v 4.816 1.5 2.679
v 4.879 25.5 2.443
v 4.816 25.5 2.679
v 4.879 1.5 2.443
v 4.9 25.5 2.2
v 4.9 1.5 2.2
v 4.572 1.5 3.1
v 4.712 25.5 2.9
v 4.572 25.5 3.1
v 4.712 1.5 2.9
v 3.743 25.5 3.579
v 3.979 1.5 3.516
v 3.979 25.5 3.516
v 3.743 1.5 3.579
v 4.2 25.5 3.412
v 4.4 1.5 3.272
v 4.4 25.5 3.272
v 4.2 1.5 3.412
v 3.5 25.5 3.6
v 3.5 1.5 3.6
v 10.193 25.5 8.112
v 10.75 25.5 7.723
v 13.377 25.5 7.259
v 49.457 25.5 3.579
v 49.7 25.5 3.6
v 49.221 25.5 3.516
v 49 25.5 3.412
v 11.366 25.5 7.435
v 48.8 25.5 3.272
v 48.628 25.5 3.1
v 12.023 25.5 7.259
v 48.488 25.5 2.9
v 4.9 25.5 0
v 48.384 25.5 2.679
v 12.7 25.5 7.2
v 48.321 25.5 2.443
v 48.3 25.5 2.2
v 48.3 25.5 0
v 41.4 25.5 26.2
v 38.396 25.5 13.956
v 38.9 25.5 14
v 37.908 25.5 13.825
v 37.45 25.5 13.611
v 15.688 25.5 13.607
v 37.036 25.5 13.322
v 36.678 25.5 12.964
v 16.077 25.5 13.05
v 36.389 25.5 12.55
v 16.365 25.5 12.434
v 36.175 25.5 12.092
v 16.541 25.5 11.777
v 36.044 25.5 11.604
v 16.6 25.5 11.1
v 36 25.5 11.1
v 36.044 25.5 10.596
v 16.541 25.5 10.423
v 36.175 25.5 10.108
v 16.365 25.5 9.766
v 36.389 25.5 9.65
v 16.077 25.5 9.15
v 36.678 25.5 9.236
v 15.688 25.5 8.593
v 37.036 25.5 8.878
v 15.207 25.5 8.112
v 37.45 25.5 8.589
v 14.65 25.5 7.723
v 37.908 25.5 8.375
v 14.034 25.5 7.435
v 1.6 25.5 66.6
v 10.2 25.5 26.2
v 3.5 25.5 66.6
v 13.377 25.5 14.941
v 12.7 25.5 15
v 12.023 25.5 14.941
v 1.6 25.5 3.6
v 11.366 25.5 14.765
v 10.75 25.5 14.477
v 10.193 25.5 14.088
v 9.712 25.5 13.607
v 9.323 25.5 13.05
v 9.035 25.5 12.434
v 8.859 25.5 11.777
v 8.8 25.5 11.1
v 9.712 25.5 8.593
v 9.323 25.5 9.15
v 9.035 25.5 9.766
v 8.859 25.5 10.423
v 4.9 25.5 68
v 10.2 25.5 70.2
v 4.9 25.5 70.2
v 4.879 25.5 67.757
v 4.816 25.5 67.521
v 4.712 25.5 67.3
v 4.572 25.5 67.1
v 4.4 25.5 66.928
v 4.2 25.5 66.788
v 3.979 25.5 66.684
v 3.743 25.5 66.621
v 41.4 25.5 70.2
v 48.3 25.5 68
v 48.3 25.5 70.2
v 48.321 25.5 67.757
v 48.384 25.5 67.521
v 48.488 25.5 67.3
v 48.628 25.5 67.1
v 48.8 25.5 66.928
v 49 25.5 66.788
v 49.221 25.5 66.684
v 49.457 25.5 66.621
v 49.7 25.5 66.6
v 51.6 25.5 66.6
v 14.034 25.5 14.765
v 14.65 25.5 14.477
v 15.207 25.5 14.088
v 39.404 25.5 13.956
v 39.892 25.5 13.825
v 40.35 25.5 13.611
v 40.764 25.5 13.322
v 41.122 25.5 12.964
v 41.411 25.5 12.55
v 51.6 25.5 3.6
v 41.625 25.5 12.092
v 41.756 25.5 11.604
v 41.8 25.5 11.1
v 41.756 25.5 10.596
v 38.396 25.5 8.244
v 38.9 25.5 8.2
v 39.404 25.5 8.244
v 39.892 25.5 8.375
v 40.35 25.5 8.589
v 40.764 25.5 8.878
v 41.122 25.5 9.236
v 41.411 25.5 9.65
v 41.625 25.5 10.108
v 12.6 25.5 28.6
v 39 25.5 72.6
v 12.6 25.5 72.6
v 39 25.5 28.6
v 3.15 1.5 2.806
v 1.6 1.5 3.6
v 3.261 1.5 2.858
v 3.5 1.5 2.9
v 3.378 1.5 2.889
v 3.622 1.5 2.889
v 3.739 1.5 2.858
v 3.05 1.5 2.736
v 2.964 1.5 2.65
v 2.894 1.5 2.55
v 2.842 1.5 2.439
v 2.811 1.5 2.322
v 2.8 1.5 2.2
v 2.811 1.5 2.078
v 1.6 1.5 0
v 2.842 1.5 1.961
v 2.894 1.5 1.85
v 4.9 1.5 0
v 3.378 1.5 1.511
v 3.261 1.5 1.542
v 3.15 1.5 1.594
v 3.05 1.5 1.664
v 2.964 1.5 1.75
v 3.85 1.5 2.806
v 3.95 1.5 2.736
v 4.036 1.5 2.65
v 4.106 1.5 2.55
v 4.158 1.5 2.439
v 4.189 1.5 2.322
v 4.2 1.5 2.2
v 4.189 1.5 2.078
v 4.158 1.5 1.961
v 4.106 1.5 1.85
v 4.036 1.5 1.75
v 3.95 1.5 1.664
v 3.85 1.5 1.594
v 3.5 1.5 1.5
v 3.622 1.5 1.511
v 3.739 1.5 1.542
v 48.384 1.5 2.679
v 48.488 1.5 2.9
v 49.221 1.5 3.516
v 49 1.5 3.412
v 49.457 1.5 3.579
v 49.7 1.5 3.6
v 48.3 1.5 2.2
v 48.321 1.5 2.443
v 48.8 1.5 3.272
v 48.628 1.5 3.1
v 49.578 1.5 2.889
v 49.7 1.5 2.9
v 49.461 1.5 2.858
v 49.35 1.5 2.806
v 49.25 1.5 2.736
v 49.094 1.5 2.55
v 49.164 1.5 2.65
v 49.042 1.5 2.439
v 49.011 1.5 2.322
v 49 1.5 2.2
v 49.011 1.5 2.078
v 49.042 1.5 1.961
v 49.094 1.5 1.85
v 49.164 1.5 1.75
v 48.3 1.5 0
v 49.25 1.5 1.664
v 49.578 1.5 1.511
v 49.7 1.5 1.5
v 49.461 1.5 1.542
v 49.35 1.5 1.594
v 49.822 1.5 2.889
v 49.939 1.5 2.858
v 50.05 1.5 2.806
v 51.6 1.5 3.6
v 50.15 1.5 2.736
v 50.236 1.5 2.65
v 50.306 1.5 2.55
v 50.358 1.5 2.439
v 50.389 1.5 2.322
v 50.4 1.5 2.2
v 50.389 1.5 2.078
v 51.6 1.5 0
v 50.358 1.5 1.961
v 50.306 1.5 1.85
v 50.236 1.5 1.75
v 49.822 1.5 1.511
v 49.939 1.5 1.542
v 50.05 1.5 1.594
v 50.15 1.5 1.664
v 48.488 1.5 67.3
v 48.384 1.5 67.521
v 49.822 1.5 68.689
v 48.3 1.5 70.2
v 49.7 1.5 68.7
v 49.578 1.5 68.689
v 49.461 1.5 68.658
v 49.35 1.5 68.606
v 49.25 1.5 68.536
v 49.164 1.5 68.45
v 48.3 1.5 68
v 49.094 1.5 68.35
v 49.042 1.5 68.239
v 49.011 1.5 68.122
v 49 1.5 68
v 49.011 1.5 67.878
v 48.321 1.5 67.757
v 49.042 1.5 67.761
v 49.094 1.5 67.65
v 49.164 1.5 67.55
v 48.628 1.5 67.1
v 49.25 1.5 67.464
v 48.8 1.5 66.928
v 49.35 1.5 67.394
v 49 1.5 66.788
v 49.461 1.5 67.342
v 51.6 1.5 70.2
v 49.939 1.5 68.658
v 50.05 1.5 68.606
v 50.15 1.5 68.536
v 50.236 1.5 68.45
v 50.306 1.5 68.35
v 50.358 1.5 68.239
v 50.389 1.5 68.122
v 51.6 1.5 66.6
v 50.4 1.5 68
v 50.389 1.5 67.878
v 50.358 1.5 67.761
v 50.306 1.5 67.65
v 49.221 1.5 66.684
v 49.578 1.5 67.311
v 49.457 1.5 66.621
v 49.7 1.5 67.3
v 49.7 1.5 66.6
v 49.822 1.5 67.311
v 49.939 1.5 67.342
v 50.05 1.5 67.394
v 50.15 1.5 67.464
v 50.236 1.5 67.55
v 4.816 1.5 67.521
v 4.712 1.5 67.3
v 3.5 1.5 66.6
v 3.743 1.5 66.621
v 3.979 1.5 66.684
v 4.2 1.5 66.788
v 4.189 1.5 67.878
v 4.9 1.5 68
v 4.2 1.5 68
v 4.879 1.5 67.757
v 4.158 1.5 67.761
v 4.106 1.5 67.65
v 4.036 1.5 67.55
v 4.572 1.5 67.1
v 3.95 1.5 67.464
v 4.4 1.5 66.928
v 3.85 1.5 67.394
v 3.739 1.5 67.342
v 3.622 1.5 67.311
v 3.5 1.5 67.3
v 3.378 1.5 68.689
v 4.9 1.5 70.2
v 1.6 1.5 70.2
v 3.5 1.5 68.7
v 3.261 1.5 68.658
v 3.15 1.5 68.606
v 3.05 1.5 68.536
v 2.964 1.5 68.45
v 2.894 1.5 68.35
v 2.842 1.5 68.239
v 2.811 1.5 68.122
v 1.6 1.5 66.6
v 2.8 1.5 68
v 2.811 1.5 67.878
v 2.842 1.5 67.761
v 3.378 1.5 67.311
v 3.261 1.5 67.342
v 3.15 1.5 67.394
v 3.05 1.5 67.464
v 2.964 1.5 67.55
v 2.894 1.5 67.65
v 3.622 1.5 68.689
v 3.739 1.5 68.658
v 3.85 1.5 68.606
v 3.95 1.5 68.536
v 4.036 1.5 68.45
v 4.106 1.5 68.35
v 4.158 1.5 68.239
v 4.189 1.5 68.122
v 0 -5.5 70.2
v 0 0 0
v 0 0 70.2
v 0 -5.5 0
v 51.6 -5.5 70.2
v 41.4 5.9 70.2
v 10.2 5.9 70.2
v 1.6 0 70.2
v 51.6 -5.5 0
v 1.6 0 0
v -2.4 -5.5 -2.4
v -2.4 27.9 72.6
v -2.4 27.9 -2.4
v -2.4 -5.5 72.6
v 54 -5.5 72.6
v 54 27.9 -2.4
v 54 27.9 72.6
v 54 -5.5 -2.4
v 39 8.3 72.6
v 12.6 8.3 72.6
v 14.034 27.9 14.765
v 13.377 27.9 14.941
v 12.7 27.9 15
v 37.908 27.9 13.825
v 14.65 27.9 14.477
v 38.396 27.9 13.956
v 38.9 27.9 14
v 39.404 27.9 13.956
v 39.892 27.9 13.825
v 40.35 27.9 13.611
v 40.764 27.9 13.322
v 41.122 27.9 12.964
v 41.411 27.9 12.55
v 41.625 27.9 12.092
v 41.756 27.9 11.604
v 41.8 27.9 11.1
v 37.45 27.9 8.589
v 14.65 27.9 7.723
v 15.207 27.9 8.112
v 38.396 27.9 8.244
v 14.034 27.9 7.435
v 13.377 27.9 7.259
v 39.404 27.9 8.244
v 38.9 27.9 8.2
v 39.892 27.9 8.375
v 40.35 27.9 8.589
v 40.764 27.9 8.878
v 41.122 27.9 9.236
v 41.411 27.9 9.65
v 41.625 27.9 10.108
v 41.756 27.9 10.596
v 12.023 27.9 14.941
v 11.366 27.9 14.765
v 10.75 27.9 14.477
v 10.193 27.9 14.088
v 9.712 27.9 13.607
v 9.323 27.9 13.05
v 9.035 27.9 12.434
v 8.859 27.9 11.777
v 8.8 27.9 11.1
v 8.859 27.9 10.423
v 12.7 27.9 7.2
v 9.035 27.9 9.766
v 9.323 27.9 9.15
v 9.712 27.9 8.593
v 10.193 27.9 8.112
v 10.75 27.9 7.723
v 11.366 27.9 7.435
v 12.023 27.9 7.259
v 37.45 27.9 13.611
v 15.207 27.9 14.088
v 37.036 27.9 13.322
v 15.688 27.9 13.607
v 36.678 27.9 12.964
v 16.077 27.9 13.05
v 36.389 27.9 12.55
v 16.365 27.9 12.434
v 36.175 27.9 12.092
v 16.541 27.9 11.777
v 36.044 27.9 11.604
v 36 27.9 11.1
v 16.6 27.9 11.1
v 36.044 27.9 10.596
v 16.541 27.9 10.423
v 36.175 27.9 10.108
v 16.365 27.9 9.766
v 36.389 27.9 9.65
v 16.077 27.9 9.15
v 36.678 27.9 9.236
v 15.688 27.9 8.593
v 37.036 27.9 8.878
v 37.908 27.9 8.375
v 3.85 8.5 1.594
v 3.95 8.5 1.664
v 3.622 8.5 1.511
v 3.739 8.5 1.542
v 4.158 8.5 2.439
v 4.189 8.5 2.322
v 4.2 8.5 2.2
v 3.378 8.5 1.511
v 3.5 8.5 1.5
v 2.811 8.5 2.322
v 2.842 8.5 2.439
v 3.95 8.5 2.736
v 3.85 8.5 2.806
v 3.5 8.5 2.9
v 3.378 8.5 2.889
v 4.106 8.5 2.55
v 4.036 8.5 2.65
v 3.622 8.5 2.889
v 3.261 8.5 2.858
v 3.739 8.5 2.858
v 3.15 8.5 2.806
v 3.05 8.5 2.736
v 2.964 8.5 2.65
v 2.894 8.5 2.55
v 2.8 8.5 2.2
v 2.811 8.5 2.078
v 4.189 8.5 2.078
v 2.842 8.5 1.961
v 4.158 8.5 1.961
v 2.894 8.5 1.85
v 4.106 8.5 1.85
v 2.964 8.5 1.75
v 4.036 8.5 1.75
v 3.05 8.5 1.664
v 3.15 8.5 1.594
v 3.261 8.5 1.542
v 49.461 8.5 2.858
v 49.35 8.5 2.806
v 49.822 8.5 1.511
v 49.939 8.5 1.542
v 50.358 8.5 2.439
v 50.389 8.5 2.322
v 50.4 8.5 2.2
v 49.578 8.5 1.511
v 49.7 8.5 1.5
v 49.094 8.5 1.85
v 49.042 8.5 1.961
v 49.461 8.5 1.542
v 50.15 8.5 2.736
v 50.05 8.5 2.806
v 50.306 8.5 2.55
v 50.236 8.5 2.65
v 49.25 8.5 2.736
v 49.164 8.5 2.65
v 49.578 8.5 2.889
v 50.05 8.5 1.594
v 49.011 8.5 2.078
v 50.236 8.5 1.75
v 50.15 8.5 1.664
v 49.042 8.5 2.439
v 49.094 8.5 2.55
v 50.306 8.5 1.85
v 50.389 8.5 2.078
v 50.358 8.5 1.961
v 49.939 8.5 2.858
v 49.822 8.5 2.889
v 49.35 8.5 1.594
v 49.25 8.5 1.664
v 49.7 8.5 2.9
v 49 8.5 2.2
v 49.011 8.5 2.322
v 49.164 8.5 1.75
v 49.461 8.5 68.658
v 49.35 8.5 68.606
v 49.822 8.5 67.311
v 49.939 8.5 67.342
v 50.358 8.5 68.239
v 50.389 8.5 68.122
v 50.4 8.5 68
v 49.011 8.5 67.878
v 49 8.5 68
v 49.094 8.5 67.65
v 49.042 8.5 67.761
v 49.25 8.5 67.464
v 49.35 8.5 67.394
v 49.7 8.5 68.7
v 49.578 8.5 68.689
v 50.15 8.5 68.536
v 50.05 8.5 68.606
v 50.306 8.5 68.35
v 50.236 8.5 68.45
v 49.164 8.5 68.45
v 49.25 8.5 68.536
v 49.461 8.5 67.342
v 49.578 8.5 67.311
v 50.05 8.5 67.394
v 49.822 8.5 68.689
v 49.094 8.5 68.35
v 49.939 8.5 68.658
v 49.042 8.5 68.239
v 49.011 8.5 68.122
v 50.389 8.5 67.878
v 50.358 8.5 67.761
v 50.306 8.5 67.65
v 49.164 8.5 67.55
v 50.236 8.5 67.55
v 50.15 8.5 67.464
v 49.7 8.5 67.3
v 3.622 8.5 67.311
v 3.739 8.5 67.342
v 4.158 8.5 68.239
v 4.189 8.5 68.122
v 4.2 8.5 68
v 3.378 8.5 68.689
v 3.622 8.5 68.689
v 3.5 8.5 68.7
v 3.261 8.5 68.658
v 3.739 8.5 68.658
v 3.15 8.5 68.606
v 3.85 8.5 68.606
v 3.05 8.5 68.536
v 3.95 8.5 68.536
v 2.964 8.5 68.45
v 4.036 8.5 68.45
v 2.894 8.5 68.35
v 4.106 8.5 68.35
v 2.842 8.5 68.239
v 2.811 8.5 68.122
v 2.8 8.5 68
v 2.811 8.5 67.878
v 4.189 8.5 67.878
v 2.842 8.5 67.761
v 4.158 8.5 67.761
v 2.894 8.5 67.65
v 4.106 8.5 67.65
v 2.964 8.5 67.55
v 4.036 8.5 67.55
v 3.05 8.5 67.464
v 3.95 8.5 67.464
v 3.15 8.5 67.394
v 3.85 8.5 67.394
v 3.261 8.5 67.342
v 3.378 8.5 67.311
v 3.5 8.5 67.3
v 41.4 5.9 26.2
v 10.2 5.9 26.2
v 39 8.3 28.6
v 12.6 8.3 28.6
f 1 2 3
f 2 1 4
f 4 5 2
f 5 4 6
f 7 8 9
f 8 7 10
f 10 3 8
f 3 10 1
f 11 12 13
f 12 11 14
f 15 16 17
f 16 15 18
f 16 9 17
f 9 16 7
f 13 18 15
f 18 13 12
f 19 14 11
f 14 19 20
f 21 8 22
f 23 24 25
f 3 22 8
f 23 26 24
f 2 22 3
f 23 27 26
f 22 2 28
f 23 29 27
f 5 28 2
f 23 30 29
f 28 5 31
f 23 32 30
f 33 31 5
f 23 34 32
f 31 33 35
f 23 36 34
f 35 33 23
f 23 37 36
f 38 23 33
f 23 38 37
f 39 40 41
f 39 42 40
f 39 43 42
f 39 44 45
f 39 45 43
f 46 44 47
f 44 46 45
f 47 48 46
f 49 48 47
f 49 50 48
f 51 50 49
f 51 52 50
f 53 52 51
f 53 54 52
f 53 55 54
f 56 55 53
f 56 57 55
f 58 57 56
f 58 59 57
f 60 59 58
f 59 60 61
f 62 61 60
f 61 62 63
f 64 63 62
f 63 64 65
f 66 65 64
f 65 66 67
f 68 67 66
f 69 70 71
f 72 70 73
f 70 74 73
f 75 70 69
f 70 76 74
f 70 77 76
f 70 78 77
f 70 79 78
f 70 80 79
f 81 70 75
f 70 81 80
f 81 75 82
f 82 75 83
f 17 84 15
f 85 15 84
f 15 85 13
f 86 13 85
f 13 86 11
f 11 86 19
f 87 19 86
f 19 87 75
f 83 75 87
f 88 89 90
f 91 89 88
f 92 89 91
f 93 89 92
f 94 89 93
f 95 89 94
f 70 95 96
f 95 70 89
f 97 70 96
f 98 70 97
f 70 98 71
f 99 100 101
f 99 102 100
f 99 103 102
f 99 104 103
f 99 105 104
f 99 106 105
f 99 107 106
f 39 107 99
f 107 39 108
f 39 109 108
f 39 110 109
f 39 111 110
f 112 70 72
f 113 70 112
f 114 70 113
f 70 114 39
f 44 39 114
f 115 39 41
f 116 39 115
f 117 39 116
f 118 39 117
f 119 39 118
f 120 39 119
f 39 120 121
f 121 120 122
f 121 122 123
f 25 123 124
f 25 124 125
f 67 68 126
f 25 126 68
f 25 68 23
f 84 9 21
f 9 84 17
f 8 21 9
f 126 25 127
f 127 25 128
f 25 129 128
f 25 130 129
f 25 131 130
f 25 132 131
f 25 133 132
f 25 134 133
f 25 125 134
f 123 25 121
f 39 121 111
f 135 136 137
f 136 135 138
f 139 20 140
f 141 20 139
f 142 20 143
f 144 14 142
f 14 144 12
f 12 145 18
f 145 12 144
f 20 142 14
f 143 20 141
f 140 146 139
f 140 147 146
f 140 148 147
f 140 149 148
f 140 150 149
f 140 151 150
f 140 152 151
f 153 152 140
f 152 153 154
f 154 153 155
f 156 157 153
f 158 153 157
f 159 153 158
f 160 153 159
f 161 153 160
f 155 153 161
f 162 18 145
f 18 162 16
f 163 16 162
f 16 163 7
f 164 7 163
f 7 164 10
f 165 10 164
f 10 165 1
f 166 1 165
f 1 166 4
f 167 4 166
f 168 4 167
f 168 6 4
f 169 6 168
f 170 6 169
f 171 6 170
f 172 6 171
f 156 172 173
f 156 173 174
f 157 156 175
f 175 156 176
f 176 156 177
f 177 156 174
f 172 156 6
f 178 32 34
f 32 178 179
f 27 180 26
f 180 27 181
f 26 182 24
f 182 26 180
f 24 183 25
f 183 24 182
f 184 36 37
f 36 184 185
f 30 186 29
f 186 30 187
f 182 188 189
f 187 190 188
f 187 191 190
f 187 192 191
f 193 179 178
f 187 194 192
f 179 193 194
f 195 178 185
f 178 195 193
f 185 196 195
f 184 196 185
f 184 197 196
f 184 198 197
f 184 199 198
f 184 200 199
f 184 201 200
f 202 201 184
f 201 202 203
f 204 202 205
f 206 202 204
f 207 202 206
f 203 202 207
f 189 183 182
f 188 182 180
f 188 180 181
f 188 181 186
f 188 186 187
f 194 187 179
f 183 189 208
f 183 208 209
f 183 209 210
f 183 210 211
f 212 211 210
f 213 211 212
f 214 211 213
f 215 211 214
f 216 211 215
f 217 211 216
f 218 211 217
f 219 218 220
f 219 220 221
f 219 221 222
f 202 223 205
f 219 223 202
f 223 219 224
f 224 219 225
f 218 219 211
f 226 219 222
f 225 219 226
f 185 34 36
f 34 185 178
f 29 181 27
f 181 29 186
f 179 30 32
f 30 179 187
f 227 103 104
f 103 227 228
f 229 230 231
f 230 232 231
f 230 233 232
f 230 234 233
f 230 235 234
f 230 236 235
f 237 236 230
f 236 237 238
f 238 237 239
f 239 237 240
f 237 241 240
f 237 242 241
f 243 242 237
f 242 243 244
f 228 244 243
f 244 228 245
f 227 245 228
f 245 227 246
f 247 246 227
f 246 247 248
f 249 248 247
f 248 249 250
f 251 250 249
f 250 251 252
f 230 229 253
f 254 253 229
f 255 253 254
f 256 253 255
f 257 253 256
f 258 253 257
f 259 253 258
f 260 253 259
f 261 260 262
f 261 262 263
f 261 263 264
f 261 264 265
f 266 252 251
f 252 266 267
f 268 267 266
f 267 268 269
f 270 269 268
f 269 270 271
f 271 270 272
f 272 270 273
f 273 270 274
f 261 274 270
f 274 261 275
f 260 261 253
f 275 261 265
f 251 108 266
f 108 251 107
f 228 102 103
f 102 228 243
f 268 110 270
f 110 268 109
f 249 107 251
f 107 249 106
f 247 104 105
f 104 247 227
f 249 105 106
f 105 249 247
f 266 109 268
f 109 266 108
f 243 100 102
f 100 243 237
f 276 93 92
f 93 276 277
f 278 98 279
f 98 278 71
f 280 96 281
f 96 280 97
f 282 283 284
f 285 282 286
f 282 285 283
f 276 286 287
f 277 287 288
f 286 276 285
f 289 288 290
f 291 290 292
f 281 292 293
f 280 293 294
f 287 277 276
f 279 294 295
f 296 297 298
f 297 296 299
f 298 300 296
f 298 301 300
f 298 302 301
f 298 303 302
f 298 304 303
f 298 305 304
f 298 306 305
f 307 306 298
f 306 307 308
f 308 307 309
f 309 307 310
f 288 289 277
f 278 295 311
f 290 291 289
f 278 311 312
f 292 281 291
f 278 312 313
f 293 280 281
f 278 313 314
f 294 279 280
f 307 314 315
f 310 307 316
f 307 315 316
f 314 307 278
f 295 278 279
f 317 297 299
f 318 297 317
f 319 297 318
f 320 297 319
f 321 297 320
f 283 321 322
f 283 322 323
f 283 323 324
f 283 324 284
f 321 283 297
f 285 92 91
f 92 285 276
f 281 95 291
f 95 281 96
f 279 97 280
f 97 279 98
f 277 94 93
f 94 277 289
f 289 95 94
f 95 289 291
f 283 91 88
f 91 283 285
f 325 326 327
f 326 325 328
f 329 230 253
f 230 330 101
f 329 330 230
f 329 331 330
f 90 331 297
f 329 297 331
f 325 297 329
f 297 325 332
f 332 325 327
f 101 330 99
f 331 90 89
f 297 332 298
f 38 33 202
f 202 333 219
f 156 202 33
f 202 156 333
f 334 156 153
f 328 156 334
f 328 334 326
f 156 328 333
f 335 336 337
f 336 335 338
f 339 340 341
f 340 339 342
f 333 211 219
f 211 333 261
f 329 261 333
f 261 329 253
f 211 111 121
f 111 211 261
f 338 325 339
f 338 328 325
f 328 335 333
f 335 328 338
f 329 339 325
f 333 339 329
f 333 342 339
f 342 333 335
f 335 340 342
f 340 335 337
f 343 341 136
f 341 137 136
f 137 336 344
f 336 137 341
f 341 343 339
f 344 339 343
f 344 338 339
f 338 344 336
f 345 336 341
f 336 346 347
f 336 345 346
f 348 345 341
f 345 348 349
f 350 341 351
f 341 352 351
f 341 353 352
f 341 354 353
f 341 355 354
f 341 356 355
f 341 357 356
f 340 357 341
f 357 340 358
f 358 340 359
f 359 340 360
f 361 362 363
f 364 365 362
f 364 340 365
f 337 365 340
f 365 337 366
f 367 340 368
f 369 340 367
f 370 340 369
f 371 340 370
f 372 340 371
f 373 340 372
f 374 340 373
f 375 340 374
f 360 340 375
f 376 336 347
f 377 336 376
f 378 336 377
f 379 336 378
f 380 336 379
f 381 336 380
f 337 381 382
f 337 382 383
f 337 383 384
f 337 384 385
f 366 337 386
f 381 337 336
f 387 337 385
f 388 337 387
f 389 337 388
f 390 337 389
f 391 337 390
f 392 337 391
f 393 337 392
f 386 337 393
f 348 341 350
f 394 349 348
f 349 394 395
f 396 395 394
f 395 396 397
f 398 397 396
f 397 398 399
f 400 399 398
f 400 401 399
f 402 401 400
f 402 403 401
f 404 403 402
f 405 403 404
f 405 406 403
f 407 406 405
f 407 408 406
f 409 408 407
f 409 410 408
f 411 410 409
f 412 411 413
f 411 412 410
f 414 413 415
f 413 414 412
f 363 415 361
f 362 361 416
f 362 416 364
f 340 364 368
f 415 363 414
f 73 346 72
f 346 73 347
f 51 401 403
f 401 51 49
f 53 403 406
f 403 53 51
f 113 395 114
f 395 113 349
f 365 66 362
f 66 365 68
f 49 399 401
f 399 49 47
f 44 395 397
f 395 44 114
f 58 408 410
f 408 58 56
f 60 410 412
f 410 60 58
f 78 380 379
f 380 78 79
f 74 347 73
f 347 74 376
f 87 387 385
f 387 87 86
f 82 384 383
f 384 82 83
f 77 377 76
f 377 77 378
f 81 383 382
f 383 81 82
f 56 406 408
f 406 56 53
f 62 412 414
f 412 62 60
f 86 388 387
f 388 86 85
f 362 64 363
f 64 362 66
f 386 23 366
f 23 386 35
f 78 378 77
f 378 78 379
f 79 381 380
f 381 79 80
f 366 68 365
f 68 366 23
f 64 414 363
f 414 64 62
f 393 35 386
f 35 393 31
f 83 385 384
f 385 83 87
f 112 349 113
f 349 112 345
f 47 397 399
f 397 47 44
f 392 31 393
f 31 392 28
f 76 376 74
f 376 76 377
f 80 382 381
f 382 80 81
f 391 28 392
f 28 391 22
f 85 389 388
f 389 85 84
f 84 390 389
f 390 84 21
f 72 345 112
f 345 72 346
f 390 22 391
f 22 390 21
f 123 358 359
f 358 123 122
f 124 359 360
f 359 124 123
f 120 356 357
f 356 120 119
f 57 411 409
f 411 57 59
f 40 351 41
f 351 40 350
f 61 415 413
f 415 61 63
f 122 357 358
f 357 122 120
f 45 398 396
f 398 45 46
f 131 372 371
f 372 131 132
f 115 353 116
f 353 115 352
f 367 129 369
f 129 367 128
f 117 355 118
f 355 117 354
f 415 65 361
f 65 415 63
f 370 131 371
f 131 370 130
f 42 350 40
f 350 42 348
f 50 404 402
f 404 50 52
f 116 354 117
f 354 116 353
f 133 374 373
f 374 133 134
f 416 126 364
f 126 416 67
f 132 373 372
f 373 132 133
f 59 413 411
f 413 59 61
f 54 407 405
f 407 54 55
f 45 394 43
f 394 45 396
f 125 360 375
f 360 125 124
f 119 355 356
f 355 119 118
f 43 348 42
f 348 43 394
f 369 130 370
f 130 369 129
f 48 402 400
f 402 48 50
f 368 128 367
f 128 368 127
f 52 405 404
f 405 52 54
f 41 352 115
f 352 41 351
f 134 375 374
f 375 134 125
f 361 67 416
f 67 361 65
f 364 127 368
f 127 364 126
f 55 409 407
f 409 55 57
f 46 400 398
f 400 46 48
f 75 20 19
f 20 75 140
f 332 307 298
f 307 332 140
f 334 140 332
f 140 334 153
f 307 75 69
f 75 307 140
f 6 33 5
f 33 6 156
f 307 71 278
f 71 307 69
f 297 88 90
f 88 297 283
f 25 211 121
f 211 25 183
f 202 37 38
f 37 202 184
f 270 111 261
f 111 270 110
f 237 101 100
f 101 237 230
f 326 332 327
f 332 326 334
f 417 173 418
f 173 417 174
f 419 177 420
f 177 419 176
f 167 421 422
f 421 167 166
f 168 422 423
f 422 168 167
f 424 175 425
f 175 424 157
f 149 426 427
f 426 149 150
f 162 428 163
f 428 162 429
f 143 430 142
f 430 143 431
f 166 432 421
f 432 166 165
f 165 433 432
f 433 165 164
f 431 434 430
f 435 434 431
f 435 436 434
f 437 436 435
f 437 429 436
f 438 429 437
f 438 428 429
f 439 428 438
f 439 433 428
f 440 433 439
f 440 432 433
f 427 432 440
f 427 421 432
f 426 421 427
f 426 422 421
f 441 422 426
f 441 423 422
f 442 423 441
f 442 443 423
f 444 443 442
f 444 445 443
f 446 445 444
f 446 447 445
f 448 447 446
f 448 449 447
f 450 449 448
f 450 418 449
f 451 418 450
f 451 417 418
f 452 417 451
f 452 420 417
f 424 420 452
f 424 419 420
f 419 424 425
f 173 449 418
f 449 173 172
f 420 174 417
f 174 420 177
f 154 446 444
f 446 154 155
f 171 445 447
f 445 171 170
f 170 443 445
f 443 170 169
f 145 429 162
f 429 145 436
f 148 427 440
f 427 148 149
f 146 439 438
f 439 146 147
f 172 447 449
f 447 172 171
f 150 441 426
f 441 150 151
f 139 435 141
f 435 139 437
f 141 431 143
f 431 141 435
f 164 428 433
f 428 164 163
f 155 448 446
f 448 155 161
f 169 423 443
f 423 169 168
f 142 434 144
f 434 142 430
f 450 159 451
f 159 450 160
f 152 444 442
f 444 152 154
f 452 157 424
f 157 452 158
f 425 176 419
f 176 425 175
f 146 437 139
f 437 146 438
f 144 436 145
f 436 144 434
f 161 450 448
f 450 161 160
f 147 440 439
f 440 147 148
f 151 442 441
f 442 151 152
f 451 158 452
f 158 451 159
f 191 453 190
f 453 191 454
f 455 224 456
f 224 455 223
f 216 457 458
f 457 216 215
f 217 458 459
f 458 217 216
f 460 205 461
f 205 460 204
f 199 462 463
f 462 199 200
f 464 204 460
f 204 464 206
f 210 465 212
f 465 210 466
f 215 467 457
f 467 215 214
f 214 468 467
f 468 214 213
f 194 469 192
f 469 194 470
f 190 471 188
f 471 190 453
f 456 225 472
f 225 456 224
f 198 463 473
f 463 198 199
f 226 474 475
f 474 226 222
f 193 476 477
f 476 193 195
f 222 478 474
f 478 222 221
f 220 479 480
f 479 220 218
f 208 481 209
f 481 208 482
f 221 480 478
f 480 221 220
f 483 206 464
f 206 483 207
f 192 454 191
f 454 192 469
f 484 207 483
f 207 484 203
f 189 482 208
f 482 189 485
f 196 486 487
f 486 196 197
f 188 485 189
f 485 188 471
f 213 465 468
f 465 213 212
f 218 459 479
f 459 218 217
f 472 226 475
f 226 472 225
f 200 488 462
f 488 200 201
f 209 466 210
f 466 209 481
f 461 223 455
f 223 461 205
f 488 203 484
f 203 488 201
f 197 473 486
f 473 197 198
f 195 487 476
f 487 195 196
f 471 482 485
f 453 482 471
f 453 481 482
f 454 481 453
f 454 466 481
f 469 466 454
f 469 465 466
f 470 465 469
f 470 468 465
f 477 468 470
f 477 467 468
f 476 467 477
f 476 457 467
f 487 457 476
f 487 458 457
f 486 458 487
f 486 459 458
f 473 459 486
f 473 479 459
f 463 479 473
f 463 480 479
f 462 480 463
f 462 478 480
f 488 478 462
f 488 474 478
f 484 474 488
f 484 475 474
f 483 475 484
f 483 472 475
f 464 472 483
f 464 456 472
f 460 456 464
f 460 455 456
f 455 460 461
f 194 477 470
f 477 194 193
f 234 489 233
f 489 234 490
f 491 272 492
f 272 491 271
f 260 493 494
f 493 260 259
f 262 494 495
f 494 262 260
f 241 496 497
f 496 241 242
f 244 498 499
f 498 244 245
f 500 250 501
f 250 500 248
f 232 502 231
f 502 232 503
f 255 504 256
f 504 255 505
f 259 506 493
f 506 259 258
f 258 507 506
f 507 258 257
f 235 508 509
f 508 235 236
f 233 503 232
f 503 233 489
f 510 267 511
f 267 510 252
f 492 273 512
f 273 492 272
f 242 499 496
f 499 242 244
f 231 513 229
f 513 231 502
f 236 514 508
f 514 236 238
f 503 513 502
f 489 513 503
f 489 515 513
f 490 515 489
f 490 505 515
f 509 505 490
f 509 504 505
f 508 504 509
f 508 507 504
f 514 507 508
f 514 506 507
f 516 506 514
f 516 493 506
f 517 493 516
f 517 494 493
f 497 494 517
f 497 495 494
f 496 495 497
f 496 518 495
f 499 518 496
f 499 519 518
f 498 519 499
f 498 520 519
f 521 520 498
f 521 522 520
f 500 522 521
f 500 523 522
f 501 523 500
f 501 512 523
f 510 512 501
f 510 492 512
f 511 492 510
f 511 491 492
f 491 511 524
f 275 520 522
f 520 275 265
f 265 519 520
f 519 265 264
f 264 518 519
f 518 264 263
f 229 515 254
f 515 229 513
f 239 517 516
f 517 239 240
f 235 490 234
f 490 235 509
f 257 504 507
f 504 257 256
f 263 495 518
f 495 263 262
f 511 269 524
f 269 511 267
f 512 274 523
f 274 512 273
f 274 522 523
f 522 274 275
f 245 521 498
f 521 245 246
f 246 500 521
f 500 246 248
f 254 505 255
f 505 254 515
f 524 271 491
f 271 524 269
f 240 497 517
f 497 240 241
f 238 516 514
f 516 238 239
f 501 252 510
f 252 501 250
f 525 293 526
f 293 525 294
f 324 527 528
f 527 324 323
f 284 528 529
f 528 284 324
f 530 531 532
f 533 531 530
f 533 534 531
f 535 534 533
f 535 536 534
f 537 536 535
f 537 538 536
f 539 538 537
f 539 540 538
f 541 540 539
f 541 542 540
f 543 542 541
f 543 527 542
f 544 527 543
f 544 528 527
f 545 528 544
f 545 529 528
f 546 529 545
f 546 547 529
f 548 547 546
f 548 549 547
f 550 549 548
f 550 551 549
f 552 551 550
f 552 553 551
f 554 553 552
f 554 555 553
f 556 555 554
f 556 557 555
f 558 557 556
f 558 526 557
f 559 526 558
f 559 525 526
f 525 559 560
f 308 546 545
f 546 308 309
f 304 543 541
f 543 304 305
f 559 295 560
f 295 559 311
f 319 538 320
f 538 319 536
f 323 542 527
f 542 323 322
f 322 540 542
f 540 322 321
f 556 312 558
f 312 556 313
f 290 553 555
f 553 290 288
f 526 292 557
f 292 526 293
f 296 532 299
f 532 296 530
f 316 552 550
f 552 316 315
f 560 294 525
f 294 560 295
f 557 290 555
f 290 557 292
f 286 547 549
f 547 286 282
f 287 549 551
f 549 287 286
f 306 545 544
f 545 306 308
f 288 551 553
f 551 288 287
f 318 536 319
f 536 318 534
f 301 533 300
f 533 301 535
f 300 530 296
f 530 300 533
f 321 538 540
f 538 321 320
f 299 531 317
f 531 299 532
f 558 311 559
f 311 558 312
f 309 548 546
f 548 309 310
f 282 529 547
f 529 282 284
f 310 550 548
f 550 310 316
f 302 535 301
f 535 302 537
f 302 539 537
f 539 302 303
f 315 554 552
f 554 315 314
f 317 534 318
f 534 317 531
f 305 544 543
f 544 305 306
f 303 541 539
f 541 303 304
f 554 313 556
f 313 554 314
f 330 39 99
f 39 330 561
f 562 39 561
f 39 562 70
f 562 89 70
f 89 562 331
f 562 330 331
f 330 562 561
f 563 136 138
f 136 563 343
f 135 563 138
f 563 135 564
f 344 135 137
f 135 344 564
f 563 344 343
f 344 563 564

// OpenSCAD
$fn=36;
$sl = 7; //schraubenlänge gesamt
$sk = 1.5; //schraube kopfdicke
$pd = 1.5; //plattinendicke
$ledh = 7 - $pd; //led höhe
$lsqa = 45; //breite und höhe led leucht fläche
//50*70.2 //platinenmaße
$pb = 50;
$ph = 70.2;
$z=5.2;//abstand oben led quadratfläche
$x=1.7;//abstand links led quadratfläche
$agesamt=$pb-$lsqa;//
$x2=$agesamt-$x;
$ad=$agesamt/2; //durchschnittsabstand
$ax=$x2-$x; //zusatzshift ist durschschnittsabstand (also soll - tatsächlichen abstand
//falsch, da wir ja immer rechts mehr als den durschschnittsabstand haben, müssen wir schauen, dass wir links auf die breite von rechts kommen, der versinkt ja nirgends
$depth = 24; //tiefe von platine bis tiefsten bauteil (schalter)
$t=2.4;
$lr2lrh = 68; //loch von außenrand zu außenrand => mit platinenmaßen und loch durchmesser kann abstand von außen berechnet werden
$lr2lrb = 48.4;
$rb = ($pb-$lr2lrb)/2; //rand breite (lochabstand)
$rh = ($ph-$lr2lrh)/2; //rand breite (lochabstand)
$ld = 2.2; //loch durchmesser schrauben von platine
$lds = 1.4; //schraube selbst durchmesser 1.7 dünne gewindestelle 1.4
$mr = 2.8; //maximaler Radius von zentrum platinenloch bis zur nähesten lötstelle
$lswd = 5.8; //durchmesser switch loch
$lstd = 7.8; //durchmesser stecker loch
$hw = 4.8 - $pd; //hoehe widerstände, lötseite brauche ich nicht, da hier die schauben eh länger sind als benötigt
$loetd = 4; //doch lieber einkalkulieren, mit der 9v batterie könnte es dann doch eng werden
$mra = 1.4; //minimaler rand (links von vorne)
$schalter = 13; //höhe und breite schalter
$ast = $schalter + 2 - $lstd/2; //abstand stecker + switch, da switch 13 (mit toleranz 15)
$9vb=26.4; //wiki 26.2
$9vd=17.2; //wiki 17
$9vh=44; //wiki 48.5 aber wir wollen ja, dass er oben raussteht
//9v batteriefach
$9vbs=$9vb+$t*2;
$9vds=$9vd+$t;
$9vhs=$9vh+$t;

echo ("ledh: ", $ledh);
echo ("agesamt: ", $agesamt);
echo ("x2: ", $x2);
echo ("ad: ", $ad);
echo ("ax: ", $ax);

/* [Wände] */
$platine = false;
$waende = true;
$rueckwand = true;
$loetzinn = false;

////////////////////
// Modules
////////////////////

module loch($h,$d,$y)
{
    translate([0,$y+$pd,0])
    rotate([90,0,0])
    cylinder(h=$h,d1=$d,d2=$d);
}

module platinenloch()
{
    loch($pd,$ld,0);
}

module platine()
{
    if ($platine)
    {
        color("green")
        cube([$pb,$pd,$ph]);
    }
    
    if ($platine)
    {
        loecher()
        {
            color("orange")
            platinenloch();
        }
    }
}

module schraubenloecher()
{
    loecher()
    {
        color("gray")
        loch($sl,$lds,$sl);
    }
}

module loecher()
{
    translate([$ld/2+$rb,0,$ld/2+$rh])
    children(0);
    
    translate([$pb-$ld/2-$rb,0,$ld/2+$rh])
    children(0);
    
    translate([$pb-$ld/2-$rb,0,$ph-$ld/2-$rh])
    children(0);
    
    translate([$ld/2+$rb,0,$ph-$ld/2-$rh])
    children(0);  
}

module platinenzentrum()
{
    difference()
    {
        color("white")
        loecher()
        {
            loch($depth,$mr,$depth);
        }
        platine();
    }

    if ($platine)
    {
        //LEDs
        color("white")
        translate([$x,-$ledh,$ph-$lsqa-$z])
        cube([$lsqa,$ledh,$lsqa]);
    }
}

if ($loetzinn)
{
    //Lötzinn
    color("gray")
    translate([$ax+$mra/2,$pd,$mra/2])
    cube([$pb-$mra,$loetd,$ph-$mra]);
}

module waende()
{
    if ($waende)
    {
        //Wände
        //links
        translate([-$t,$pd,0])
        cube([$t,$depth,$ph]);
        //rechts
        translate([$pb+$ax,$pd,0])
        cube([$t,$depth,$ph]);

        //links
        color("pink")
        translate([-$t,-$ledh,0])
        cube([$t,$pd+$ledh,$ph]);
        //rechts
        color("pink")
        translate([$pb+$ax,-$ledh,0])
        cube([$t,$pd+$ledh,$ph]);

        //unten
        color("#FF0000")
        translate([-$t,-$ledh,-$t])
        cube([$t+$pb+$ax+$t,$pd+$ledh,$t]);

        //unten
        color("#FF4444")
        translate([-$t,$pd,-$t])
        cube([$t+$pb+$ax+$t,$depth,$t]);
    }
}

module oberteil()
{
    difference()
    {
        //oben gehäuse
        color("#FF4444")
        translate([-$t,$pd,$ph])
        cube([$t+$pb+$ax+$t,$depth,$t]);
        
        batterie();
    }
    
    //oben blende
    color("#FF0000")
    translate([-$t,-$ledh,$ph])
    cube([$t+$pb+$ax+$t,$pd+$ledh,$t]);
}

module rueckwand()
{       
    if ($rueckwand)
    {
        difference()
        {
            //hinten
            color("#FF8888") //absichtlich, damit perspektive von vorne besser mittigkeit von leds beurteilen lässt
            translate([-$t,$depth+$pd,-$t])
            cube([$t+$pb+$ax+$t,$t,$t+$ph+$t]);
                
            //loch stecker
            translate([$ast+$ax,$pd,$ast])
            color("#AA88FF")
            loch($t,$lstd,$depth+$t-$pd);

            //loch schalter
            translate([$pb-$ast,$pd,$ast])
            color("#AA8822")
            loch($t,$lswd,$depth+$t-$pd);
        }
    }
}

module platinenersatz()
{
    //platinenersatz
    //damit kein staub rein kommt, könnten wir ja links den schlitz zudrucken, mit einem stück was ax füllt und so dick ist wie die platine
    color("#44FF44")
    cube([$ax,$pd+$depth, $ph]); //das muss bis hinter, sonst muss ich support drucken
}

module platinenhalter_h()
{
    cube([$rb+$ld+($mr-$ld)/2-$mr/2,$depth,$rh+$ld+($mr-$ld)/2]);
}

module platinehalter_v()
{
    cube([$rb+$ld+($mr-$ld)/2,$depth,$rh+$ld+($mr-$ld)/2-$mr/2]);
}

module platinenhalterzumrand()
{
    //platinenhalter zum rand
    //ru (von vorne, von hinten lu) 
    translate([$ax,$pd,0])
    platinenhalter_h();
    translate([$ax,$pd,0])
    platinehalter_v();
    
    //ro
    translate([$ax,$pd,$ph-($rh+$ld+($mr-$ld)/2)])
    platinenhalter_h();
    translate([$ax,$pd,$ph-($rh+$ld+($mr-$ld)/2-$mr/2)])
    platinehalter_v();
    
    //lu
    translate([($ax+$pb)-($rb+$ld+($mr-$ld)/2-$mr/2),$pd,0])
    platinenhalter_h();
    translate([($ax+$pb)-($rb+$ld+($mr-$ld)/2),$pd,0])
    platinehalter_v();
   
    //lo
    translate([($ax+$pb)-($rb+$ld+($mr-$ld)/2-$mr/2),$pd,$ph-($rh+$ld+($mr-$ld)/2)])
    platinehalter_v();
    translate([($ax+$pb)-($rb+$ld+($mr-$ld)/2),$pd,$ph-($rh+$ld+($mr-$ld)/2-$mr/2)])
    platinehalter_v();
}

module batterie()
{
    //9v batterie (oben muss er durchstoßen, aber hinten nehmen wir einfach die Wand die eh schon da ist)
    
    color("#973512")
    translate([(($ax+$pb)-$9vb)/2,$pd+$depth-$9vd,($ph-$9vh)+$t])
    cube([$9vb,$9vd,$9vh]);
}

module batteriefach()
{
    color("#351297")
    translate([(($ax+$pb)-$9vbs)/2,$pd+$depth-$9vds,($ph-$9vhs)+$t])
    cube([$9vbs,$9vds,$9vhs]);
}

module batterieholder()
{
    difference()
    {
        batteriefach();
        batterie();
    }
}

module gehause()
{
    translate([$ax,0,0])
    platinenzentrum();

    waende();

    rueckwand();

    platinenersatz();

    color("#AAAAFF")
    platinenhalterzumrand();
}

module oberteil2()
{
    translate([-$t,-$ledh,$ph])
    cube([$t+$pb+$ax+$t,$pd+$ledh+$depth-$9vds,$t]);
}

module oberteilmitbatteriefach()
{
    batterieholder();
    difference()
    {
        oberteil();
        oberteil2();
    }
}

module gehausemitloch()
{
    difference()
    {
        gehause();
        translate([$ax,0,0])
        schraubenloecher();
    }
}

////////////////////
//Render
////////////////////

gehausemitloch();
oberteilmitbatteriefach();
oberteil2();
